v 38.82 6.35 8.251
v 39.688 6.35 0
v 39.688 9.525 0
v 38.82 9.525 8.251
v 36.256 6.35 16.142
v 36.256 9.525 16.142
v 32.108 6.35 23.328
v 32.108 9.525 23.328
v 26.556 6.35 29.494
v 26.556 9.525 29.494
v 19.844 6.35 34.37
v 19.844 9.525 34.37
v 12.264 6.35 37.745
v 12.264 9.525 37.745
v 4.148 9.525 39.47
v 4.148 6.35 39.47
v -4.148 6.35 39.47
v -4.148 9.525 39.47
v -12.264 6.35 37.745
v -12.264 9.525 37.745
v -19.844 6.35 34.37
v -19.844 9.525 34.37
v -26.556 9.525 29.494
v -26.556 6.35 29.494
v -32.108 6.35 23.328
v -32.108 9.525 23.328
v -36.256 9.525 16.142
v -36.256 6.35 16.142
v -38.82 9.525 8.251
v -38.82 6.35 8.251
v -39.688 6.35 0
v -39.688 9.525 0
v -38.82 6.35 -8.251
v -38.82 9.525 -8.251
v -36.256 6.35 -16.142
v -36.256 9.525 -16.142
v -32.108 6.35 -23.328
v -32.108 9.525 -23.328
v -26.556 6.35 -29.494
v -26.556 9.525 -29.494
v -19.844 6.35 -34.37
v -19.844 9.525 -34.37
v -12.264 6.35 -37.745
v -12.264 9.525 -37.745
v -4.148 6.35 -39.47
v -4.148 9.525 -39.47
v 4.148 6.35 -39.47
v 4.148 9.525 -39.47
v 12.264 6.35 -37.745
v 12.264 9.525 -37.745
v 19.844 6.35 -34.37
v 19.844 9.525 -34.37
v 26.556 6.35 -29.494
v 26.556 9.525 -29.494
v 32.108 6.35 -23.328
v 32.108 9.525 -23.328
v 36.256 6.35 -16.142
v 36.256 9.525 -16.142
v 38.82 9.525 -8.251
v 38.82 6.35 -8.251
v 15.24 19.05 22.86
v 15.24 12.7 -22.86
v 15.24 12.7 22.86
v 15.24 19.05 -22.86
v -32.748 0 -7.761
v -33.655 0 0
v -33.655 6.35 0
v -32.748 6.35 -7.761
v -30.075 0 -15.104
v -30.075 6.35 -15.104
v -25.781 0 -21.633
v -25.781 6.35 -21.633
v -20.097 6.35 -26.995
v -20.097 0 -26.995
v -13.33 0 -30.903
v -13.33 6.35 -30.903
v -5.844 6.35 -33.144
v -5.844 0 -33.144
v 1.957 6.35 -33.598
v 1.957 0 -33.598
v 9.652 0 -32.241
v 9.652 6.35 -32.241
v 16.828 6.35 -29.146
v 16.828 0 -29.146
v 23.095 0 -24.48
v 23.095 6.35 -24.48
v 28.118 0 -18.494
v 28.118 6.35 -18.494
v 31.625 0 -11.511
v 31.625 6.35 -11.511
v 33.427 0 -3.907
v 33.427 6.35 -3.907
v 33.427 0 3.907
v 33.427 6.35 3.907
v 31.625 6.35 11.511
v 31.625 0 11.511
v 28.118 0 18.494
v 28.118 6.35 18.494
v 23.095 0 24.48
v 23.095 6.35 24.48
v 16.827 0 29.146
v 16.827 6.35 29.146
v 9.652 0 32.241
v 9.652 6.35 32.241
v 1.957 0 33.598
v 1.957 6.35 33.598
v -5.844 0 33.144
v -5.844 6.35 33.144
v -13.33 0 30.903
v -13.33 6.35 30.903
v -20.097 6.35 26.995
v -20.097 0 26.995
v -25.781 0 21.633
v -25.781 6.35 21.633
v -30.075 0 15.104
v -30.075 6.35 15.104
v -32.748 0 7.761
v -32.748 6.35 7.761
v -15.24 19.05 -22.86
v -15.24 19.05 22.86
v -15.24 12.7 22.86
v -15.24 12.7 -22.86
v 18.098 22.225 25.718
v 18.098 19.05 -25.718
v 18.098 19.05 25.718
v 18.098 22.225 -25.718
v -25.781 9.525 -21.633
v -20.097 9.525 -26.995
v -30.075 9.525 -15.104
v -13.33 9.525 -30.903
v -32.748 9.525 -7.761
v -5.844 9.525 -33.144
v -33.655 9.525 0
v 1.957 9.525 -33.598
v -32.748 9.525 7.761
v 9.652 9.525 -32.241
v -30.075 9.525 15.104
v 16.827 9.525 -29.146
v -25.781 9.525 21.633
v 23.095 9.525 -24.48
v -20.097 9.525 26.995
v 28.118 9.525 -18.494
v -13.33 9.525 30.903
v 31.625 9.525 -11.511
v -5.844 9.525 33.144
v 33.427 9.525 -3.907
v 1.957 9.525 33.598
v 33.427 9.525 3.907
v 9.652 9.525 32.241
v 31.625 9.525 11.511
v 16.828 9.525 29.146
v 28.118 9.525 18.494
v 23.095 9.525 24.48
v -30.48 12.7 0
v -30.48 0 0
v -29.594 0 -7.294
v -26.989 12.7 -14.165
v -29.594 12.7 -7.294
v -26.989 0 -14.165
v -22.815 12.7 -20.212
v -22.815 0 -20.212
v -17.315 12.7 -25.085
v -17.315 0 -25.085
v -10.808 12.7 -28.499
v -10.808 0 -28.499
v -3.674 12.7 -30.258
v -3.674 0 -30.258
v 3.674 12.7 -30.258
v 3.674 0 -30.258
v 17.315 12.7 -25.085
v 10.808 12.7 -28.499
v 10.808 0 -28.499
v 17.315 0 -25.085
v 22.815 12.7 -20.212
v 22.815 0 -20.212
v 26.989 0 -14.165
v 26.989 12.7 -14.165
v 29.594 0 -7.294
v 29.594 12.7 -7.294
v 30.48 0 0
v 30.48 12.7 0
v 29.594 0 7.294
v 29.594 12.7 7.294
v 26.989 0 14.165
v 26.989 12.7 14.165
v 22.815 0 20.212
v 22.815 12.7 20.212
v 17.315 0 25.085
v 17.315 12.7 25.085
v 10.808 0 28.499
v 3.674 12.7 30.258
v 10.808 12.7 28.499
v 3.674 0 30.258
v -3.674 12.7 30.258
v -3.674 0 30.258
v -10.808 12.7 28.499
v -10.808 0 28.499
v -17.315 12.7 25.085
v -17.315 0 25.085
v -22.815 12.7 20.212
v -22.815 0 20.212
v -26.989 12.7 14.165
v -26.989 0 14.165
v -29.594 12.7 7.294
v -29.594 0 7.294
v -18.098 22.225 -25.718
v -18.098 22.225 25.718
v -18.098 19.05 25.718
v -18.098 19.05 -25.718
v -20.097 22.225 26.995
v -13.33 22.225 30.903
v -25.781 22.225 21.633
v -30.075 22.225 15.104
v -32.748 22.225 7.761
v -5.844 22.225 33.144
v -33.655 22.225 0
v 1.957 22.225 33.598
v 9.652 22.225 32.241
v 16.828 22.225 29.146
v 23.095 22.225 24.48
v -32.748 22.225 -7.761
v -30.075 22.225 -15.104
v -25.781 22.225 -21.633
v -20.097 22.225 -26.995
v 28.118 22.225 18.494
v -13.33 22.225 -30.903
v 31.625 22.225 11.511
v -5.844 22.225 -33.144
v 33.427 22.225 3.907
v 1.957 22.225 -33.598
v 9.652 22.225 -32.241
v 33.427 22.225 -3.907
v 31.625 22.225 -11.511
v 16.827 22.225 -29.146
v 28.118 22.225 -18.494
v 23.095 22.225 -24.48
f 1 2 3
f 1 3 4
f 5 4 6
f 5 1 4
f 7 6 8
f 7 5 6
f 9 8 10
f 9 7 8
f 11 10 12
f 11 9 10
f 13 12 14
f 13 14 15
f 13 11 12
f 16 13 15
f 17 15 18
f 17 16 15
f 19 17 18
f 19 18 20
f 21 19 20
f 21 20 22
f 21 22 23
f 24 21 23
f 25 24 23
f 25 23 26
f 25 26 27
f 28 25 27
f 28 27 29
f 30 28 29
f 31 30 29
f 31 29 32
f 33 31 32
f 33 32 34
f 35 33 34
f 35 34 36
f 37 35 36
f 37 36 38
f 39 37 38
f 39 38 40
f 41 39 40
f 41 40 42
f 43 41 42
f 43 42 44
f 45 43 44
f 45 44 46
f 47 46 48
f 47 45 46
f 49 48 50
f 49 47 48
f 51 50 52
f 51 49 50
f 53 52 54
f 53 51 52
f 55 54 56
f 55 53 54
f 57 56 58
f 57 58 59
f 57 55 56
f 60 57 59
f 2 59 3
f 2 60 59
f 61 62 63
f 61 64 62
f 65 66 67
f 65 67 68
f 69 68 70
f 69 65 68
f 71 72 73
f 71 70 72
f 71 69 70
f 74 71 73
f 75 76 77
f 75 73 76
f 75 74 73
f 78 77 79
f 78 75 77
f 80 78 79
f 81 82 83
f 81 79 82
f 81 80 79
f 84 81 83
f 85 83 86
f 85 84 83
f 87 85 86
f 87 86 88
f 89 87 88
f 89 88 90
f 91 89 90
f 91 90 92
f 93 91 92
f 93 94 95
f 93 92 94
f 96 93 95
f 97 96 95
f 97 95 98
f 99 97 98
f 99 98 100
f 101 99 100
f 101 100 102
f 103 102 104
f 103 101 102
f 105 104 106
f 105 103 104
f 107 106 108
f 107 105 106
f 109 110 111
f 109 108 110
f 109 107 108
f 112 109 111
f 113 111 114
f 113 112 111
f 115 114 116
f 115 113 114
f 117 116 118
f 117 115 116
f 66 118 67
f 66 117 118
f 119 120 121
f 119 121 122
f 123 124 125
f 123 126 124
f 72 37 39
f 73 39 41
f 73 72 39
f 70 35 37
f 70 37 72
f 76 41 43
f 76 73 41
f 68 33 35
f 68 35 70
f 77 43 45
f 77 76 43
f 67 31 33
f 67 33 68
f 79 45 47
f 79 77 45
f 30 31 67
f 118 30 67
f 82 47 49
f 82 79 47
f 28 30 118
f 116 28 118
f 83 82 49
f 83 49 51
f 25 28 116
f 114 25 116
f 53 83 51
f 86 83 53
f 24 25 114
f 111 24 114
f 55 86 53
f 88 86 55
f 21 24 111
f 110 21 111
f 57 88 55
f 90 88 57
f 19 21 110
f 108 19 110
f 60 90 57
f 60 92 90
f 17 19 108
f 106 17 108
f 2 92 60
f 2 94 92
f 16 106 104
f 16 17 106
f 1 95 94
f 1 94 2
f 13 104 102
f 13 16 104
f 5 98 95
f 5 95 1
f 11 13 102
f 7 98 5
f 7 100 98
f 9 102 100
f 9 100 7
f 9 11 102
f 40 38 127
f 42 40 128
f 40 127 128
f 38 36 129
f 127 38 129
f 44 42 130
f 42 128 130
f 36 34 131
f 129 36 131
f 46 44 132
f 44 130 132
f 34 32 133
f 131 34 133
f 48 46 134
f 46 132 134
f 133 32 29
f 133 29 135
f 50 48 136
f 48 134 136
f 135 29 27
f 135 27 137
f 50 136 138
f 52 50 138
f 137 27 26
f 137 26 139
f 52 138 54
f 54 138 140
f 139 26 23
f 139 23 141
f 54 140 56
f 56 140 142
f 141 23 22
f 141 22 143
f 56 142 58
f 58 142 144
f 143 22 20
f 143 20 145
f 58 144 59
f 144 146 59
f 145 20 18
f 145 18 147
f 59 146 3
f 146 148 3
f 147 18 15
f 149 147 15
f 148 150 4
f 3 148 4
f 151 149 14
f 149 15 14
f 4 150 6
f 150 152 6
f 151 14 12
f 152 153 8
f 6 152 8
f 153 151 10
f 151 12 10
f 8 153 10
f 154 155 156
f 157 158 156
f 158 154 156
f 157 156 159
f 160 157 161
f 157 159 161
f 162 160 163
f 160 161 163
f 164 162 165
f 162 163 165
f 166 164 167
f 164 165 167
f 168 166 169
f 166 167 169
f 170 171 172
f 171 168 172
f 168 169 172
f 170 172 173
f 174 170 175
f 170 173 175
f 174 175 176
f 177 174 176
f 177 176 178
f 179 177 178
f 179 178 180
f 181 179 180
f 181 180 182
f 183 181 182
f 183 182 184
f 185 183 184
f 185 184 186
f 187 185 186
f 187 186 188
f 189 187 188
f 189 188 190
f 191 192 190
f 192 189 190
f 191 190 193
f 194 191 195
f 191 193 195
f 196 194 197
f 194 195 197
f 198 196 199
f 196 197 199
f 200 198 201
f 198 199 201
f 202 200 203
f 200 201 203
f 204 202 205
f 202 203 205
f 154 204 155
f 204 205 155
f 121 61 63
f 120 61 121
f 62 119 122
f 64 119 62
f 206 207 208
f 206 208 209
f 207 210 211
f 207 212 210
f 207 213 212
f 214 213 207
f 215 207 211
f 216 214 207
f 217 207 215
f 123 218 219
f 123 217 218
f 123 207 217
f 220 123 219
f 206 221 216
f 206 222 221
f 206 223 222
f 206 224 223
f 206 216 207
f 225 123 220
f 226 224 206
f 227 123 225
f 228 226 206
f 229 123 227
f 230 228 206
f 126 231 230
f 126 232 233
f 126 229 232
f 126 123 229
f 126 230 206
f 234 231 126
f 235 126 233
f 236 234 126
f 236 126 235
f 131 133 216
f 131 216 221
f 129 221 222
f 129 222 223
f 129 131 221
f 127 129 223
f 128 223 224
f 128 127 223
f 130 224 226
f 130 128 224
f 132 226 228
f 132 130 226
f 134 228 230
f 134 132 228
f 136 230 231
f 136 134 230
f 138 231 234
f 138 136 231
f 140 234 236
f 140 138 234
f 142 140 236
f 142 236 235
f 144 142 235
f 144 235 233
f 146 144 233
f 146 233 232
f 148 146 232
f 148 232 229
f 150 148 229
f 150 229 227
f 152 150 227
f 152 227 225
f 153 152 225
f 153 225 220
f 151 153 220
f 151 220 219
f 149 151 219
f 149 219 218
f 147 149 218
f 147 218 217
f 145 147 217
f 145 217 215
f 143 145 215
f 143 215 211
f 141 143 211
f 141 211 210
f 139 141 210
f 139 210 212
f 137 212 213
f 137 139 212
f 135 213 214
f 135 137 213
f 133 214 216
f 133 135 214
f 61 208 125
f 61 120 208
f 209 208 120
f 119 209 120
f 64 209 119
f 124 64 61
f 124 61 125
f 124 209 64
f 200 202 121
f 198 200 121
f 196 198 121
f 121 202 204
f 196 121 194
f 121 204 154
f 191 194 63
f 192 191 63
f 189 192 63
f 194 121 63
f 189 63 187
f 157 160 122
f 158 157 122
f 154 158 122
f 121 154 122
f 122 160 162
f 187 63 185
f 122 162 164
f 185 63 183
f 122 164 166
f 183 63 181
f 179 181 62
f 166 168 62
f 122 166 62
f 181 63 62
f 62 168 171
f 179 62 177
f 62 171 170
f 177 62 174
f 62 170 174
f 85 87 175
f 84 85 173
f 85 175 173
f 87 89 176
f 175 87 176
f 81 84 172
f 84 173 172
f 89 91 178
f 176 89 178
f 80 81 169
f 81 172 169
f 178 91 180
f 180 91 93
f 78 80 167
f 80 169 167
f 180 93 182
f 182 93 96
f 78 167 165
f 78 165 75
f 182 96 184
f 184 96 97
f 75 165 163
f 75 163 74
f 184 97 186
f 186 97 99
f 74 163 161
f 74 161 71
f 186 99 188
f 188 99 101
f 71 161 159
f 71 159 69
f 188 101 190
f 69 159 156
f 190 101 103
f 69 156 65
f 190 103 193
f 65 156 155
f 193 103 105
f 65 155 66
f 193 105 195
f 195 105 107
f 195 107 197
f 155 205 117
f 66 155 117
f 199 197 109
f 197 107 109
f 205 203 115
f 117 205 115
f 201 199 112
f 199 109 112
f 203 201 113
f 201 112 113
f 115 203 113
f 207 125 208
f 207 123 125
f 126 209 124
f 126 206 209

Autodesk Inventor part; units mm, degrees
ref_plane "YZ Plane" through (0, 0, 0) normal (1, 0, 0) x (0, 1, 0)
ref_plane "XZ Plane" through (0, 0, 0) normal (0, 1, 0) x (-1, 0, 0)
ref_plane "XY Plane" through (0, 0, 0) normal (0, 0, 1) x (1, 0, 0)
sketch "Sketch1" plane through (0, 0, 0) normal (0, 1, 0) x (-1, 0, 0)
  circle A0 centre (0, 0) radius 33.655
  circle A1 centre (0, 0) radius 30.48
  dimension "d0" = 67.31
  dimension "d1" = 60.96
extrude "Extrusion1" add sketch "Sketch1" along normal blind 12.7
sketch "Sketch2" plane through (0, 12.7, 0) normal (0, 1, 0) x (1, 0, 0)
  circle A0 centre (0, 0) radius 33.655
extrude "Extrusion2" add sketch "Sketch2" along normal blind 9.525
sketch "Sketch3" plane through (0, 22.225, 0) normal (0, 1, 0) x (1, 0, 0)
  line L0 (18.0975, -25.7175) -> (-18.0975, -25.7175)
  line L1 (-18.0975, -25.7175) -> (-18.0975, 25.7175)
  line L2 (-18.0975, 25.7175) -> (18.0975, 25.7175)
  line L3 (18.0975, 25.7175) -> (18.0975, -25.7175)
  line L4 (18.0975, -25.7175) -> (-18.0975, 25.7175) construction
  line L5 (-18.0975, -25.7175) -> (18.0975, 25.7175) construction
  point P0 (0, 0)
  dimension "d6" = 36.195
  dimension "d7" = 51.435
extrude "Extrusion3" cut sketch "Sketch3" against normal blind 3.175
sketch "Sketch4" plane through (0, 19.05, 0) normal (0, 1, 0) x (1, 0, 0)
  line L0 (15.24, -22.86) -> (-15.24, -22.86)
  line L1 (-15.24, -22.86) -> (-15.24, 22.86)
  line L2 (-15.24, 22.86) -> (15.24, 22.86)
  line L3 (15.24, 22.86) -> (15.24, -22.86)
  line L4 (15.24, -22.86) -> (-15.24, 22.86) construction
  line L5 (-15.24, -22.86) -> (15.24, 22.86) construction
  point P0 (0, 0)
  dimension "d10" = 30.48
  dimension "d11" = 45.72
extrude "Extrusion4" cut sketch "Sketch4" against normal through all
ref_plane "Work Plane1" through (0, 6.35, 0) normal (0, -1, 0) x (1, 0, 0)
sketch "Sketch5" plane through (0, 6.35, 0) normal (0, -1, 0) x (1, 0, 0)
  circle A0 centre (0, 0) radius 33.655
  circle A1 centre (0, 0) radius 29.8345
  circle A2 centre (0, 0) radius 39.6875
  dimension "d15" = 79.375
extrude "Extrusion5" add sketch "Sketch5" against normal blind 3.175 contours A2
properties part number "Upper Coll r2ar"
